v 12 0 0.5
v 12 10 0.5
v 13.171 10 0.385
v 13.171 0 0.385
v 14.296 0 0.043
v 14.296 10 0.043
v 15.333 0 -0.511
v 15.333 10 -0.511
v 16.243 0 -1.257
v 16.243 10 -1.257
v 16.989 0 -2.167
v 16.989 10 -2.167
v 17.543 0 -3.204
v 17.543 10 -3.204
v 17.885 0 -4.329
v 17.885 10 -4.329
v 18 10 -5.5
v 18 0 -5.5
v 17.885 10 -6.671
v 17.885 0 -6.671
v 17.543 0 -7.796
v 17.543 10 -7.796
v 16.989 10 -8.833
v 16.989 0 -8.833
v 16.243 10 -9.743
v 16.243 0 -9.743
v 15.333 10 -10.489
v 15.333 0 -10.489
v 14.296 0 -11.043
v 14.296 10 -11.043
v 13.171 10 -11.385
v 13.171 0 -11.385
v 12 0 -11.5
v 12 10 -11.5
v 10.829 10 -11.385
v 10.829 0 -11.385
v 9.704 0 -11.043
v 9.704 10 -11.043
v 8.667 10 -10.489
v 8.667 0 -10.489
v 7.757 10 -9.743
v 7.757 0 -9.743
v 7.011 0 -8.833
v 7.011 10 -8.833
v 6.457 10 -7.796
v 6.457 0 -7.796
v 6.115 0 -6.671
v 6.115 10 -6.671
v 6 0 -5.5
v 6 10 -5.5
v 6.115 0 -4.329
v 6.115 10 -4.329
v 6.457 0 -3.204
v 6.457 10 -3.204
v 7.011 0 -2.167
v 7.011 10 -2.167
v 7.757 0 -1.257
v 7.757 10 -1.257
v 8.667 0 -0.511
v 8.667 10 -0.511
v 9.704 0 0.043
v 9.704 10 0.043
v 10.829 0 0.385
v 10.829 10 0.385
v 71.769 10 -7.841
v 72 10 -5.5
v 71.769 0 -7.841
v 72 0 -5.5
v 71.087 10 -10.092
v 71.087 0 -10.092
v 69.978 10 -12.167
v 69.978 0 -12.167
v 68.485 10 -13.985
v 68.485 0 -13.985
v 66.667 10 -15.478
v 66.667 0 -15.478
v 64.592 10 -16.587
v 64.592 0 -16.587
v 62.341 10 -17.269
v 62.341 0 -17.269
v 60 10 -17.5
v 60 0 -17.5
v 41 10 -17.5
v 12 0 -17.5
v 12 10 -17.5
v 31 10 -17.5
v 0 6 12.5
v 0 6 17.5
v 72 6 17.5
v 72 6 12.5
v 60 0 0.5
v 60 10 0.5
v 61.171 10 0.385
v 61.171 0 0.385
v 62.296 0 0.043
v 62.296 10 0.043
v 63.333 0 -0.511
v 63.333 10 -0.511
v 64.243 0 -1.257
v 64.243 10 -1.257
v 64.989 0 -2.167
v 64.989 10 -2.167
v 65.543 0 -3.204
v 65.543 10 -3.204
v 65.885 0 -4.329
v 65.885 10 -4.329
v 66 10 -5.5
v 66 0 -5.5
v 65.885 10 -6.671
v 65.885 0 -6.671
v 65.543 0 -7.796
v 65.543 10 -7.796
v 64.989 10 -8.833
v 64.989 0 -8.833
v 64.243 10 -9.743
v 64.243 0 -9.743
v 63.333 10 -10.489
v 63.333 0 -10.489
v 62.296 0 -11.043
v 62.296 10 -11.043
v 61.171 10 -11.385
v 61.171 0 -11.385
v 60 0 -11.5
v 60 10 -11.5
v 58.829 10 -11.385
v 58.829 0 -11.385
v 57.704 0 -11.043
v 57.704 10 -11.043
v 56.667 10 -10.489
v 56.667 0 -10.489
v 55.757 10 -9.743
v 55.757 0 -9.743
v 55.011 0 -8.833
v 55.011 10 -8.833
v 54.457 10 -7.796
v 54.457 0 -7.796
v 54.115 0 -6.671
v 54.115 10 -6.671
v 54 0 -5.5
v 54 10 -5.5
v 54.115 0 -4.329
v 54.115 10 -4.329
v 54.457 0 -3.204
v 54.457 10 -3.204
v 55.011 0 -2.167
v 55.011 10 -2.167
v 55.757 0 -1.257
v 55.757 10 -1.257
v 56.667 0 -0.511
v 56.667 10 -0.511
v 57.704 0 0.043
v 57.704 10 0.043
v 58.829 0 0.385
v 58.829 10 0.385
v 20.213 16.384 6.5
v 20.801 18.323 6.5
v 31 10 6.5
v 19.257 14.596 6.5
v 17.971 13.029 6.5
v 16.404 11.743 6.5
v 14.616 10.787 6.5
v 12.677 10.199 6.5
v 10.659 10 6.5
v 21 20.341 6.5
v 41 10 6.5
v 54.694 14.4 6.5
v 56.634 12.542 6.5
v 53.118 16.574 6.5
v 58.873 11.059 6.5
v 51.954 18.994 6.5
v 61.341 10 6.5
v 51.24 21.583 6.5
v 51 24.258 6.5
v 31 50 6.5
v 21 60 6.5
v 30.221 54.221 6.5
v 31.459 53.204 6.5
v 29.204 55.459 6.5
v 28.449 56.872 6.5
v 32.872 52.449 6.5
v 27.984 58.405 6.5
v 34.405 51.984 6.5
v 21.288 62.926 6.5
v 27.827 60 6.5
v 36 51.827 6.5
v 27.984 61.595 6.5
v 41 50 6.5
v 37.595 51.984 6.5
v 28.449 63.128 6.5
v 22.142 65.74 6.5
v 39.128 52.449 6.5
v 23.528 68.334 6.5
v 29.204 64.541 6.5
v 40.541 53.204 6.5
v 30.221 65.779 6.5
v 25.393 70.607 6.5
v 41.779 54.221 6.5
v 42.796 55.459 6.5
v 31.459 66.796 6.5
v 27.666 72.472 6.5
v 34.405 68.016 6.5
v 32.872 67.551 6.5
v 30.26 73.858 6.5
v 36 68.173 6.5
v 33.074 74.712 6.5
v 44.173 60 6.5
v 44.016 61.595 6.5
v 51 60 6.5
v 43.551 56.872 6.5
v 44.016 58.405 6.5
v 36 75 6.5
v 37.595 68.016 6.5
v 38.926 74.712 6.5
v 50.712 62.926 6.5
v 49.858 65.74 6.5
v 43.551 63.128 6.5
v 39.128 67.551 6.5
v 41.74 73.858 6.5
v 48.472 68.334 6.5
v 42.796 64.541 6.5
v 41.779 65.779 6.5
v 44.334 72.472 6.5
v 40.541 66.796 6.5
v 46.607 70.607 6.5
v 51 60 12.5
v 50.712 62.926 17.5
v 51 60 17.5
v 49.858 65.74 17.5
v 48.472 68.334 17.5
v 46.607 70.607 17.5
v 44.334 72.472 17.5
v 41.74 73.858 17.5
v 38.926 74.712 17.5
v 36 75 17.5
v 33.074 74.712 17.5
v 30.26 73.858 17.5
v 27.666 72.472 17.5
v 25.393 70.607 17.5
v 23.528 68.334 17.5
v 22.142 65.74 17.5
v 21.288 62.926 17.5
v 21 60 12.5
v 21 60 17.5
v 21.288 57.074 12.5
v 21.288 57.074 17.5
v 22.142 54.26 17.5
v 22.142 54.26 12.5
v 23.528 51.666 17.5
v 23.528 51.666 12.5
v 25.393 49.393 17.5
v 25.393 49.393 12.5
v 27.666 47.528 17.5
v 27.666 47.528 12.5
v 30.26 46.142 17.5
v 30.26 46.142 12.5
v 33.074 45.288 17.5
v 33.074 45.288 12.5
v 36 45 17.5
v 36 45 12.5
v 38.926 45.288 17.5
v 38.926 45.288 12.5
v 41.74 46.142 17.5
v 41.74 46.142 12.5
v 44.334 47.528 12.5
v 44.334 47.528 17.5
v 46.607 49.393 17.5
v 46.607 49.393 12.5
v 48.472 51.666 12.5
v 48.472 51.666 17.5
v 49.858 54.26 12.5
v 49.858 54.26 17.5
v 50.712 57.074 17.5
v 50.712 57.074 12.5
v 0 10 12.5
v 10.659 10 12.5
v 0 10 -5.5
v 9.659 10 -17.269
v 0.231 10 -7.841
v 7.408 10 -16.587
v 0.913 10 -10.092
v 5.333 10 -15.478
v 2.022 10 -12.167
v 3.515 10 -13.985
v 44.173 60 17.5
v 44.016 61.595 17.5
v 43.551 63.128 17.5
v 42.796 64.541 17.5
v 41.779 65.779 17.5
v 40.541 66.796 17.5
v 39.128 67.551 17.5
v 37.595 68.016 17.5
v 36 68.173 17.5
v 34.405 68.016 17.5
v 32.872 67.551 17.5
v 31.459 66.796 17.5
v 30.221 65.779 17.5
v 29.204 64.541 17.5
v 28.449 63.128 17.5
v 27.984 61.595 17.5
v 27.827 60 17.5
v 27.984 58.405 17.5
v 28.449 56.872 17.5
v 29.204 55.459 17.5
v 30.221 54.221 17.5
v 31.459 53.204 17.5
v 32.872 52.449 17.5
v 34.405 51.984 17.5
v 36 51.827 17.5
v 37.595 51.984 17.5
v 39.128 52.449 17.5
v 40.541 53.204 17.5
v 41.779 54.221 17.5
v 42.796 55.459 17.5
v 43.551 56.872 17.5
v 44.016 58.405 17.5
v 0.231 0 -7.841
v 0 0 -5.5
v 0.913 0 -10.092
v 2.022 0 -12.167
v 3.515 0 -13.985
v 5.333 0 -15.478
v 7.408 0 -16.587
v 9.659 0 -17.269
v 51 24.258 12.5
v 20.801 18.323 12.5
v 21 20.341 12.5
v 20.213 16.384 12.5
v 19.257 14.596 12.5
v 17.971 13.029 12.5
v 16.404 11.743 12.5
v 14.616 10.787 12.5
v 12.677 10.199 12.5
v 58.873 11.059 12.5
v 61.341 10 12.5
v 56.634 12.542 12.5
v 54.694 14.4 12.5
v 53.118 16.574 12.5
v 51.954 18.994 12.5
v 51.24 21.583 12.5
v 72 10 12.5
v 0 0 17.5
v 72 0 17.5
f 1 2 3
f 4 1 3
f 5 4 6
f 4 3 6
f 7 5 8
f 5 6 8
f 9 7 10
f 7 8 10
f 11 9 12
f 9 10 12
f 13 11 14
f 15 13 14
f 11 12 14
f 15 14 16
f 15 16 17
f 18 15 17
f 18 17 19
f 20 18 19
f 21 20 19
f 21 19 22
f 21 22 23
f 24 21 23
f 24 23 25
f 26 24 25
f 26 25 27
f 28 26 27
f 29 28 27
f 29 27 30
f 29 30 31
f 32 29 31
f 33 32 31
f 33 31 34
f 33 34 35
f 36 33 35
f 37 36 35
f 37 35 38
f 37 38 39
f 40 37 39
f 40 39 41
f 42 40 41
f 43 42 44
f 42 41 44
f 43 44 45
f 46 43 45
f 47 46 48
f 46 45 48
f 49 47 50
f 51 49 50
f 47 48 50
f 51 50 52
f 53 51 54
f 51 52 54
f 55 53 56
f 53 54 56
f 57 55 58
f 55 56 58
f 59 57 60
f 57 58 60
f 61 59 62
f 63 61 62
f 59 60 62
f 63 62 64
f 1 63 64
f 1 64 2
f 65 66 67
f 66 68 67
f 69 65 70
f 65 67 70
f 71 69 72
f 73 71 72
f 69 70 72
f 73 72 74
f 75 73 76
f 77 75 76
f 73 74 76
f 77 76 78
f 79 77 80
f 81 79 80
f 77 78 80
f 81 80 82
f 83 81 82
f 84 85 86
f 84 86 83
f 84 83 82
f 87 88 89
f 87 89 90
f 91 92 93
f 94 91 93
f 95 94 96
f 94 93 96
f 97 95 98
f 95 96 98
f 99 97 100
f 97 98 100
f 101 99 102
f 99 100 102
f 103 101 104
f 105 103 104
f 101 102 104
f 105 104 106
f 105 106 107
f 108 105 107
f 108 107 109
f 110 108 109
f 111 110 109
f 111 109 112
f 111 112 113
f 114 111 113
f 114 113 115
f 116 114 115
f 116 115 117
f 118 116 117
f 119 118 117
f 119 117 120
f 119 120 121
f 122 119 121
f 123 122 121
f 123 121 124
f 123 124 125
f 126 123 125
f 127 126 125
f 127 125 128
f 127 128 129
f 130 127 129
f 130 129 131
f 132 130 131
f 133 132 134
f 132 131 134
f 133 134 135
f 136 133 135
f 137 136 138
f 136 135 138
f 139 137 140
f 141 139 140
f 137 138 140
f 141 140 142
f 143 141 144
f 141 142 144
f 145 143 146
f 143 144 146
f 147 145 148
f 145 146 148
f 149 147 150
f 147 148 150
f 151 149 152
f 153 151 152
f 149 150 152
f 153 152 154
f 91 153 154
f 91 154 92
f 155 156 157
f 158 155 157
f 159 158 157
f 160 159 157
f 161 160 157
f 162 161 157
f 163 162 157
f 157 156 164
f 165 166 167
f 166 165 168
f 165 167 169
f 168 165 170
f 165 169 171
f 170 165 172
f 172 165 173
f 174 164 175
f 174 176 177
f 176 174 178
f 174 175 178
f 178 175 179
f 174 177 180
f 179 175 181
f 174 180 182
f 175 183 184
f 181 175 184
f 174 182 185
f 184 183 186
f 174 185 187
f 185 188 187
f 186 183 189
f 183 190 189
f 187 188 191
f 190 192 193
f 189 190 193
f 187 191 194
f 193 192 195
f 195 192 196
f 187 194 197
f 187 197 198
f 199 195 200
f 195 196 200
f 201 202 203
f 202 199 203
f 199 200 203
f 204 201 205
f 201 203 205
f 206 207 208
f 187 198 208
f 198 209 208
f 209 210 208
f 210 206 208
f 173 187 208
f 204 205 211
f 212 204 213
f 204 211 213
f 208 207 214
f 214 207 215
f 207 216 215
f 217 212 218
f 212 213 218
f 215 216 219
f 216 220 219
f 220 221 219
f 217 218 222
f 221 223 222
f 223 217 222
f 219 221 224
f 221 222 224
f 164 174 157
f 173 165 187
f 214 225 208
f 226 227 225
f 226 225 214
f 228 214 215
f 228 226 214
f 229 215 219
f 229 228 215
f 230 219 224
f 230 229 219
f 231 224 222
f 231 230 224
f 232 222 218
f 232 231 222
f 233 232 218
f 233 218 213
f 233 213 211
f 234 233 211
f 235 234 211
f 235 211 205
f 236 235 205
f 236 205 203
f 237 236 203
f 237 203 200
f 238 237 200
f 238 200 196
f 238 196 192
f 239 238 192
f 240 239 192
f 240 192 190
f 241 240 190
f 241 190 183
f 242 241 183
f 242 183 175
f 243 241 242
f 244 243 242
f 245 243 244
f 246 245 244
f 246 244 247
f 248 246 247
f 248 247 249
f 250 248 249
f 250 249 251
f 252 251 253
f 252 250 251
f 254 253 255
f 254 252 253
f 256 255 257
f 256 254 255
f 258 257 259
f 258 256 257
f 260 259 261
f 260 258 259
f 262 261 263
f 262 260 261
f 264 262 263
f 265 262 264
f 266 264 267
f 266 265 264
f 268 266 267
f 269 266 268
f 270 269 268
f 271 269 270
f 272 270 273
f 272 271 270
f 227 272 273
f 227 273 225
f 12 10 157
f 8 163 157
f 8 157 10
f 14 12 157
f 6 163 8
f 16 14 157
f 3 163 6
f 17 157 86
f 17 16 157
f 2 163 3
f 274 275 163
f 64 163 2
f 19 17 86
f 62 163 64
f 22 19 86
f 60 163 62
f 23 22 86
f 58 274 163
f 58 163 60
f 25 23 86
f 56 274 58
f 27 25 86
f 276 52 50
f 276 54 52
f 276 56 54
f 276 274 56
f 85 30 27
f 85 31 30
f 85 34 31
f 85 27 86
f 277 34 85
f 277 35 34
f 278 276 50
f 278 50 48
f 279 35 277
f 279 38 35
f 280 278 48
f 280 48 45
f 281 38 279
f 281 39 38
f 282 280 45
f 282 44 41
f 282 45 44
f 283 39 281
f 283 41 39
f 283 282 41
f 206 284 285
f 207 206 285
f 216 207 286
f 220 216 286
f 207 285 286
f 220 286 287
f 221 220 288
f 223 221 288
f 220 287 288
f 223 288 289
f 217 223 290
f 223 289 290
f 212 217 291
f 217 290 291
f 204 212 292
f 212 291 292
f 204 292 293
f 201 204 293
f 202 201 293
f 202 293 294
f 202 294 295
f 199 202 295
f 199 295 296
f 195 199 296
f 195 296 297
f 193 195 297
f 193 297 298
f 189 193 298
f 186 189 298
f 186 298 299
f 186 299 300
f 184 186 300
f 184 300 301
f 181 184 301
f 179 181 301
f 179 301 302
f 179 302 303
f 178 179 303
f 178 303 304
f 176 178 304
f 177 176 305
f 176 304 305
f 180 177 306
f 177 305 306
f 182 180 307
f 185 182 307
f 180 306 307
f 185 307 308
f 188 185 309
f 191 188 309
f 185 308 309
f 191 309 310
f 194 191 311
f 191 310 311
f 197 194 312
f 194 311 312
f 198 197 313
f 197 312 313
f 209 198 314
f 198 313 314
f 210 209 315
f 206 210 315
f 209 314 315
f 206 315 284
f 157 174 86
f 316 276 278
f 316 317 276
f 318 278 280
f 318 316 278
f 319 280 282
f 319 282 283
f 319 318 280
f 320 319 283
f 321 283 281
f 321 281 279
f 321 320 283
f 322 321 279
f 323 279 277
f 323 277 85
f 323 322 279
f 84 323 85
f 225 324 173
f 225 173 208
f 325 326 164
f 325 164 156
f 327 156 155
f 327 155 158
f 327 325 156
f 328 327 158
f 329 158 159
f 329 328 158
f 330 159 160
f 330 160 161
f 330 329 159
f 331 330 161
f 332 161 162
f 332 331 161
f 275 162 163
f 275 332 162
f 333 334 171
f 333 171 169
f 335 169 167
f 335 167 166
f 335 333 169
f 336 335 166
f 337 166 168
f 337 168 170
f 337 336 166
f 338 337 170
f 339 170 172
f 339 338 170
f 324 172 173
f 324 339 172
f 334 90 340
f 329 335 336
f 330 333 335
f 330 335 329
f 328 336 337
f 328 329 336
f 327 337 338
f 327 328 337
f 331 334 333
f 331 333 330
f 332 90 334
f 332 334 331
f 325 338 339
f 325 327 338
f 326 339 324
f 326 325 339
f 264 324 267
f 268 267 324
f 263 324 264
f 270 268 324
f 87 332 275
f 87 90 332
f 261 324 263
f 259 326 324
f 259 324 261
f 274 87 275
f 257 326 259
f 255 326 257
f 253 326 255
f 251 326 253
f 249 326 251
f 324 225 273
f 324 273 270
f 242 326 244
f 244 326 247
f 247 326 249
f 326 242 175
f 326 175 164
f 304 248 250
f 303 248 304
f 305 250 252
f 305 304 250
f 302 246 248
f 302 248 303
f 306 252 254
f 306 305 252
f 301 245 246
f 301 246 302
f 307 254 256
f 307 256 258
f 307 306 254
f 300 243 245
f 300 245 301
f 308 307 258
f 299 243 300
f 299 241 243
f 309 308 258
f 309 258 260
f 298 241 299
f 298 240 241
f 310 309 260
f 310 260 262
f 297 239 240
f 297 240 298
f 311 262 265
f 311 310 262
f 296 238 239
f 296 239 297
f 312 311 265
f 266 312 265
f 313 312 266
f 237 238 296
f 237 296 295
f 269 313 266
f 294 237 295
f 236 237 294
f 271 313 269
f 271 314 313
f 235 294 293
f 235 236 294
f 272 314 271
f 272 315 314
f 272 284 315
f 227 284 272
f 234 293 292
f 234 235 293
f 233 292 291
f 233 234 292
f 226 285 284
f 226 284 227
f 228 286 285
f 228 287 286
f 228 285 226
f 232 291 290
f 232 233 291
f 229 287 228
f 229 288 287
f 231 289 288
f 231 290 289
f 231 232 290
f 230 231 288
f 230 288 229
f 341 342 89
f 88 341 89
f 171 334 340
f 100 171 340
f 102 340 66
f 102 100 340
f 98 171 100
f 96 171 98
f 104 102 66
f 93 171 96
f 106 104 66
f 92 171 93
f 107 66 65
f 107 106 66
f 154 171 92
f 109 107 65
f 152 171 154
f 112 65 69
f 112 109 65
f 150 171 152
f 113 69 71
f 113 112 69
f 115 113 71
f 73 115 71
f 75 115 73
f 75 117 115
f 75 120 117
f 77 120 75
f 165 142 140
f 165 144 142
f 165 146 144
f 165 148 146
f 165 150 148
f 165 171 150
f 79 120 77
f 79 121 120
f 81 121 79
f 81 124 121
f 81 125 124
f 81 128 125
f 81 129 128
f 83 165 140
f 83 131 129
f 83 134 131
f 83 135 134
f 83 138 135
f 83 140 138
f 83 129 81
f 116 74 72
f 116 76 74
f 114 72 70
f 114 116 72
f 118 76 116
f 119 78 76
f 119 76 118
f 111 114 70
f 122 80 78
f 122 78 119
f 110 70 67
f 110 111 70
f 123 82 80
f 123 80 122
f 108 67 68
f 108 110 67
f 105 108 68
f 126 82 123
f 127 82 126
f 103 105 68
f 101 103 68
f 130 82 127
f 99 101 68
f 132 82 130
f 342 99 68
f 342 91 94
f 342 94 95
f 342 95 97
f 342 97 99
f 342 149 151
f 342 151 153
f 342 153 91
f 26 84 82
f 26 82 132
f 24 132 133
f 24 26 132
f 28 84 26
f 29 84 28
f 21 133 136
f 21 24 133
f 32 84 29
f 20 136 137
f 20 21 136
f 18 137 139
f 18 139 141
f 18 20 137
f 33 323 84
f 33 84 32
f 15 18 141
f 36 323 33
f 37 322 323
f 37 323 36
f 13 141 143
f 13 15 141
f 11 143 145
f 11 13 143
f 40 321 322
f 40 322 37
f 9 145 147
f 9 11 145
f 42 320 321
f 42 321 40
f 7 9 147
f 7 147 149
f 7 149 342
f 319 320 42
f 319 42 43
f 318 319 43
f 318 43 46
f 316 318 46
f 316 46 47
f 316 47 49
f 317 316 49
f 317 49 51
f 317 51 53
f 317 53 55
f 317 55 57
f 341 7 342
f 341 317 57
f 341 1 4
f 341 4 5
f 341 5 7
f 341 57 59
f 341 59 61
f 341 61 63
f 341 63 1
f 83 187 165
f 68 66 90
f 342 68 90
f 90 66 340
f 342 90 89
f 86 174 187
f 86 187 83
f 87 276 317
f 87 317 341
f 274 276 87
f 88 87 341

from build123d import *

# Parameters (mm, degrees)
BOSS_EXTRUDE1_DEPTH = 72
BOSS_EXTRUDE4_DEPTH = 6
SKETCH5_3_R         = 8.173204637
CUT_EXTRUDE1_DEPTH  = 6
BOSS_EXTRUDE6_START = 5
SKETCH7_R           = 15
BOSS_EXTRUDE6_DEPTH = 5
CUT_EXTRUDE3_START  = 5
SKETCH5_6_R         = 8.173204637
CUT_EXTRUDE3_DEPTH  = 5
RIB6_REACH          = 87.013
SKETCH18_WALL_W     = 218.674083686
SKETCH18_WALL_H     = 10
SKETCH20_R          = 6
CUT_EXTRUDE5_DEPTH  = 99.565967758
FILLET12_R          = 12


with BuildPart() as part:
    # Sketch2 → Boss-Extrude1 (new body)
    with BuildSketch(Plane(origin=(0, 0, 0), x_dir=(0, 0, -1), z_dir=(1, 0, 0))):
        Polygon((-17.5, 0), (-17.5, 6), (-12.5, 6), (-12.5, 10), (17.5, 10), (17.5, 0), align=None)
    extrude(amount=BOSS_EXTRUDE1_DEPTH)

    # Sketch5 → Boss-Extrude4 (add)
    with BuildSketch(Plane.XY.offset(12.5)):
        with BuildLine():
            Line((21, 60), (21, 20.340753373))
            ThreePointArc((21, 20.340753373), (17.971263459, 13.028736541), (10.659246627, 10))
            Line((10.659246627, 10), (61.340753373, 10))
            ThreePointArc((61.340753373, 10), (53.857333501, 15.45146146), (51, 24.258030049))
            Line((51, 24.258030049), (51, 60))
            ThreePointArc((51, 60), (36, 75), (21, 60))
        make_face()
    extrude(amount=-BOSS_EXTRUDE4_DEPTH)

    # Sketch5<3> → Cut-Extrude1 (cut)
    with BuildSketch(Plane.XY.offset(12.5)):
        with Locations((36, 60)):
            Circle(SKETCH5_3_R)
    extrude(amount=-CUT_EXTRUDE1_DEPTH, mode=Mode.SUBTRACT)

    # Sketch7 → Boss-Extrude6 (add)
    with BuildSketch(Plane.XY.offset(12.5).offset(BOSS_EXTRUDE6_START)):
        with Locations((36, 60)):
            Circle(SKETCH7_R)
    extrude(amount=-BOSS_EXTRUDE6_DEPTH)

    # Sketch5<6> → Cut-Extrude3 (cut)
    with BuildSketch(Plane.XY.offset(12.5).offset(CUT_EXTRUDE3_START)):
        with Locations((36, 60)):
            Circle(SKETCH5_6_R)
    extrude(amount=-CUT_EXTRUDE3_DEPTH, mode=Mode.SUBTRACT)

    # Sketch18 wall → Rib6 (add, up to next)
    with BuildSketch(Plane(origin=(36, 30, -5.5), x_dir=(0, -0.857492925713, -0.514495755428), z_dir=(0, 0.514495755428, -0.857492925713)), mode=Mode.PRIVATE) as rib6_sk1:
        Rectangle(SKETCH18_WALL_W, SKETCH18_WALL_H)
    rib6_tool1 = extrude(rib6_sk1.sketch, amount=-RIB6_REACH, mode=Mode.PRIVATE) - part.part
    add(rib6_tool1.solids().sort_by_distance((36, 30, -5.5))[0])

    # Sketch20 → Cut-Extrude5 (cut, through all)
    with BuildSketch(Plane(origin=(0, 10, 0), x_dir=(1, 0, 0), z_dir=(0, 1, 0))):
        with Locations((12, 5.5)):
            Circle(SKETCH20_R)
        with Locations((60, 5.5)):
            Circle(SKETCH20_R)
    extrude(amount=-CUT_EXTRUDE5_DEPTH, mode=Mode.SUBTRACT)

    # Fillet12
    fillet12_edges = [part.edges().sort_by_distance(p)[0] for p in [
        (72, 5, -17.5),
        (0, 5, -17.5),
    ]]
    fillet(fillet12_edges, radius=FILLET12_R)


solid = part.part
